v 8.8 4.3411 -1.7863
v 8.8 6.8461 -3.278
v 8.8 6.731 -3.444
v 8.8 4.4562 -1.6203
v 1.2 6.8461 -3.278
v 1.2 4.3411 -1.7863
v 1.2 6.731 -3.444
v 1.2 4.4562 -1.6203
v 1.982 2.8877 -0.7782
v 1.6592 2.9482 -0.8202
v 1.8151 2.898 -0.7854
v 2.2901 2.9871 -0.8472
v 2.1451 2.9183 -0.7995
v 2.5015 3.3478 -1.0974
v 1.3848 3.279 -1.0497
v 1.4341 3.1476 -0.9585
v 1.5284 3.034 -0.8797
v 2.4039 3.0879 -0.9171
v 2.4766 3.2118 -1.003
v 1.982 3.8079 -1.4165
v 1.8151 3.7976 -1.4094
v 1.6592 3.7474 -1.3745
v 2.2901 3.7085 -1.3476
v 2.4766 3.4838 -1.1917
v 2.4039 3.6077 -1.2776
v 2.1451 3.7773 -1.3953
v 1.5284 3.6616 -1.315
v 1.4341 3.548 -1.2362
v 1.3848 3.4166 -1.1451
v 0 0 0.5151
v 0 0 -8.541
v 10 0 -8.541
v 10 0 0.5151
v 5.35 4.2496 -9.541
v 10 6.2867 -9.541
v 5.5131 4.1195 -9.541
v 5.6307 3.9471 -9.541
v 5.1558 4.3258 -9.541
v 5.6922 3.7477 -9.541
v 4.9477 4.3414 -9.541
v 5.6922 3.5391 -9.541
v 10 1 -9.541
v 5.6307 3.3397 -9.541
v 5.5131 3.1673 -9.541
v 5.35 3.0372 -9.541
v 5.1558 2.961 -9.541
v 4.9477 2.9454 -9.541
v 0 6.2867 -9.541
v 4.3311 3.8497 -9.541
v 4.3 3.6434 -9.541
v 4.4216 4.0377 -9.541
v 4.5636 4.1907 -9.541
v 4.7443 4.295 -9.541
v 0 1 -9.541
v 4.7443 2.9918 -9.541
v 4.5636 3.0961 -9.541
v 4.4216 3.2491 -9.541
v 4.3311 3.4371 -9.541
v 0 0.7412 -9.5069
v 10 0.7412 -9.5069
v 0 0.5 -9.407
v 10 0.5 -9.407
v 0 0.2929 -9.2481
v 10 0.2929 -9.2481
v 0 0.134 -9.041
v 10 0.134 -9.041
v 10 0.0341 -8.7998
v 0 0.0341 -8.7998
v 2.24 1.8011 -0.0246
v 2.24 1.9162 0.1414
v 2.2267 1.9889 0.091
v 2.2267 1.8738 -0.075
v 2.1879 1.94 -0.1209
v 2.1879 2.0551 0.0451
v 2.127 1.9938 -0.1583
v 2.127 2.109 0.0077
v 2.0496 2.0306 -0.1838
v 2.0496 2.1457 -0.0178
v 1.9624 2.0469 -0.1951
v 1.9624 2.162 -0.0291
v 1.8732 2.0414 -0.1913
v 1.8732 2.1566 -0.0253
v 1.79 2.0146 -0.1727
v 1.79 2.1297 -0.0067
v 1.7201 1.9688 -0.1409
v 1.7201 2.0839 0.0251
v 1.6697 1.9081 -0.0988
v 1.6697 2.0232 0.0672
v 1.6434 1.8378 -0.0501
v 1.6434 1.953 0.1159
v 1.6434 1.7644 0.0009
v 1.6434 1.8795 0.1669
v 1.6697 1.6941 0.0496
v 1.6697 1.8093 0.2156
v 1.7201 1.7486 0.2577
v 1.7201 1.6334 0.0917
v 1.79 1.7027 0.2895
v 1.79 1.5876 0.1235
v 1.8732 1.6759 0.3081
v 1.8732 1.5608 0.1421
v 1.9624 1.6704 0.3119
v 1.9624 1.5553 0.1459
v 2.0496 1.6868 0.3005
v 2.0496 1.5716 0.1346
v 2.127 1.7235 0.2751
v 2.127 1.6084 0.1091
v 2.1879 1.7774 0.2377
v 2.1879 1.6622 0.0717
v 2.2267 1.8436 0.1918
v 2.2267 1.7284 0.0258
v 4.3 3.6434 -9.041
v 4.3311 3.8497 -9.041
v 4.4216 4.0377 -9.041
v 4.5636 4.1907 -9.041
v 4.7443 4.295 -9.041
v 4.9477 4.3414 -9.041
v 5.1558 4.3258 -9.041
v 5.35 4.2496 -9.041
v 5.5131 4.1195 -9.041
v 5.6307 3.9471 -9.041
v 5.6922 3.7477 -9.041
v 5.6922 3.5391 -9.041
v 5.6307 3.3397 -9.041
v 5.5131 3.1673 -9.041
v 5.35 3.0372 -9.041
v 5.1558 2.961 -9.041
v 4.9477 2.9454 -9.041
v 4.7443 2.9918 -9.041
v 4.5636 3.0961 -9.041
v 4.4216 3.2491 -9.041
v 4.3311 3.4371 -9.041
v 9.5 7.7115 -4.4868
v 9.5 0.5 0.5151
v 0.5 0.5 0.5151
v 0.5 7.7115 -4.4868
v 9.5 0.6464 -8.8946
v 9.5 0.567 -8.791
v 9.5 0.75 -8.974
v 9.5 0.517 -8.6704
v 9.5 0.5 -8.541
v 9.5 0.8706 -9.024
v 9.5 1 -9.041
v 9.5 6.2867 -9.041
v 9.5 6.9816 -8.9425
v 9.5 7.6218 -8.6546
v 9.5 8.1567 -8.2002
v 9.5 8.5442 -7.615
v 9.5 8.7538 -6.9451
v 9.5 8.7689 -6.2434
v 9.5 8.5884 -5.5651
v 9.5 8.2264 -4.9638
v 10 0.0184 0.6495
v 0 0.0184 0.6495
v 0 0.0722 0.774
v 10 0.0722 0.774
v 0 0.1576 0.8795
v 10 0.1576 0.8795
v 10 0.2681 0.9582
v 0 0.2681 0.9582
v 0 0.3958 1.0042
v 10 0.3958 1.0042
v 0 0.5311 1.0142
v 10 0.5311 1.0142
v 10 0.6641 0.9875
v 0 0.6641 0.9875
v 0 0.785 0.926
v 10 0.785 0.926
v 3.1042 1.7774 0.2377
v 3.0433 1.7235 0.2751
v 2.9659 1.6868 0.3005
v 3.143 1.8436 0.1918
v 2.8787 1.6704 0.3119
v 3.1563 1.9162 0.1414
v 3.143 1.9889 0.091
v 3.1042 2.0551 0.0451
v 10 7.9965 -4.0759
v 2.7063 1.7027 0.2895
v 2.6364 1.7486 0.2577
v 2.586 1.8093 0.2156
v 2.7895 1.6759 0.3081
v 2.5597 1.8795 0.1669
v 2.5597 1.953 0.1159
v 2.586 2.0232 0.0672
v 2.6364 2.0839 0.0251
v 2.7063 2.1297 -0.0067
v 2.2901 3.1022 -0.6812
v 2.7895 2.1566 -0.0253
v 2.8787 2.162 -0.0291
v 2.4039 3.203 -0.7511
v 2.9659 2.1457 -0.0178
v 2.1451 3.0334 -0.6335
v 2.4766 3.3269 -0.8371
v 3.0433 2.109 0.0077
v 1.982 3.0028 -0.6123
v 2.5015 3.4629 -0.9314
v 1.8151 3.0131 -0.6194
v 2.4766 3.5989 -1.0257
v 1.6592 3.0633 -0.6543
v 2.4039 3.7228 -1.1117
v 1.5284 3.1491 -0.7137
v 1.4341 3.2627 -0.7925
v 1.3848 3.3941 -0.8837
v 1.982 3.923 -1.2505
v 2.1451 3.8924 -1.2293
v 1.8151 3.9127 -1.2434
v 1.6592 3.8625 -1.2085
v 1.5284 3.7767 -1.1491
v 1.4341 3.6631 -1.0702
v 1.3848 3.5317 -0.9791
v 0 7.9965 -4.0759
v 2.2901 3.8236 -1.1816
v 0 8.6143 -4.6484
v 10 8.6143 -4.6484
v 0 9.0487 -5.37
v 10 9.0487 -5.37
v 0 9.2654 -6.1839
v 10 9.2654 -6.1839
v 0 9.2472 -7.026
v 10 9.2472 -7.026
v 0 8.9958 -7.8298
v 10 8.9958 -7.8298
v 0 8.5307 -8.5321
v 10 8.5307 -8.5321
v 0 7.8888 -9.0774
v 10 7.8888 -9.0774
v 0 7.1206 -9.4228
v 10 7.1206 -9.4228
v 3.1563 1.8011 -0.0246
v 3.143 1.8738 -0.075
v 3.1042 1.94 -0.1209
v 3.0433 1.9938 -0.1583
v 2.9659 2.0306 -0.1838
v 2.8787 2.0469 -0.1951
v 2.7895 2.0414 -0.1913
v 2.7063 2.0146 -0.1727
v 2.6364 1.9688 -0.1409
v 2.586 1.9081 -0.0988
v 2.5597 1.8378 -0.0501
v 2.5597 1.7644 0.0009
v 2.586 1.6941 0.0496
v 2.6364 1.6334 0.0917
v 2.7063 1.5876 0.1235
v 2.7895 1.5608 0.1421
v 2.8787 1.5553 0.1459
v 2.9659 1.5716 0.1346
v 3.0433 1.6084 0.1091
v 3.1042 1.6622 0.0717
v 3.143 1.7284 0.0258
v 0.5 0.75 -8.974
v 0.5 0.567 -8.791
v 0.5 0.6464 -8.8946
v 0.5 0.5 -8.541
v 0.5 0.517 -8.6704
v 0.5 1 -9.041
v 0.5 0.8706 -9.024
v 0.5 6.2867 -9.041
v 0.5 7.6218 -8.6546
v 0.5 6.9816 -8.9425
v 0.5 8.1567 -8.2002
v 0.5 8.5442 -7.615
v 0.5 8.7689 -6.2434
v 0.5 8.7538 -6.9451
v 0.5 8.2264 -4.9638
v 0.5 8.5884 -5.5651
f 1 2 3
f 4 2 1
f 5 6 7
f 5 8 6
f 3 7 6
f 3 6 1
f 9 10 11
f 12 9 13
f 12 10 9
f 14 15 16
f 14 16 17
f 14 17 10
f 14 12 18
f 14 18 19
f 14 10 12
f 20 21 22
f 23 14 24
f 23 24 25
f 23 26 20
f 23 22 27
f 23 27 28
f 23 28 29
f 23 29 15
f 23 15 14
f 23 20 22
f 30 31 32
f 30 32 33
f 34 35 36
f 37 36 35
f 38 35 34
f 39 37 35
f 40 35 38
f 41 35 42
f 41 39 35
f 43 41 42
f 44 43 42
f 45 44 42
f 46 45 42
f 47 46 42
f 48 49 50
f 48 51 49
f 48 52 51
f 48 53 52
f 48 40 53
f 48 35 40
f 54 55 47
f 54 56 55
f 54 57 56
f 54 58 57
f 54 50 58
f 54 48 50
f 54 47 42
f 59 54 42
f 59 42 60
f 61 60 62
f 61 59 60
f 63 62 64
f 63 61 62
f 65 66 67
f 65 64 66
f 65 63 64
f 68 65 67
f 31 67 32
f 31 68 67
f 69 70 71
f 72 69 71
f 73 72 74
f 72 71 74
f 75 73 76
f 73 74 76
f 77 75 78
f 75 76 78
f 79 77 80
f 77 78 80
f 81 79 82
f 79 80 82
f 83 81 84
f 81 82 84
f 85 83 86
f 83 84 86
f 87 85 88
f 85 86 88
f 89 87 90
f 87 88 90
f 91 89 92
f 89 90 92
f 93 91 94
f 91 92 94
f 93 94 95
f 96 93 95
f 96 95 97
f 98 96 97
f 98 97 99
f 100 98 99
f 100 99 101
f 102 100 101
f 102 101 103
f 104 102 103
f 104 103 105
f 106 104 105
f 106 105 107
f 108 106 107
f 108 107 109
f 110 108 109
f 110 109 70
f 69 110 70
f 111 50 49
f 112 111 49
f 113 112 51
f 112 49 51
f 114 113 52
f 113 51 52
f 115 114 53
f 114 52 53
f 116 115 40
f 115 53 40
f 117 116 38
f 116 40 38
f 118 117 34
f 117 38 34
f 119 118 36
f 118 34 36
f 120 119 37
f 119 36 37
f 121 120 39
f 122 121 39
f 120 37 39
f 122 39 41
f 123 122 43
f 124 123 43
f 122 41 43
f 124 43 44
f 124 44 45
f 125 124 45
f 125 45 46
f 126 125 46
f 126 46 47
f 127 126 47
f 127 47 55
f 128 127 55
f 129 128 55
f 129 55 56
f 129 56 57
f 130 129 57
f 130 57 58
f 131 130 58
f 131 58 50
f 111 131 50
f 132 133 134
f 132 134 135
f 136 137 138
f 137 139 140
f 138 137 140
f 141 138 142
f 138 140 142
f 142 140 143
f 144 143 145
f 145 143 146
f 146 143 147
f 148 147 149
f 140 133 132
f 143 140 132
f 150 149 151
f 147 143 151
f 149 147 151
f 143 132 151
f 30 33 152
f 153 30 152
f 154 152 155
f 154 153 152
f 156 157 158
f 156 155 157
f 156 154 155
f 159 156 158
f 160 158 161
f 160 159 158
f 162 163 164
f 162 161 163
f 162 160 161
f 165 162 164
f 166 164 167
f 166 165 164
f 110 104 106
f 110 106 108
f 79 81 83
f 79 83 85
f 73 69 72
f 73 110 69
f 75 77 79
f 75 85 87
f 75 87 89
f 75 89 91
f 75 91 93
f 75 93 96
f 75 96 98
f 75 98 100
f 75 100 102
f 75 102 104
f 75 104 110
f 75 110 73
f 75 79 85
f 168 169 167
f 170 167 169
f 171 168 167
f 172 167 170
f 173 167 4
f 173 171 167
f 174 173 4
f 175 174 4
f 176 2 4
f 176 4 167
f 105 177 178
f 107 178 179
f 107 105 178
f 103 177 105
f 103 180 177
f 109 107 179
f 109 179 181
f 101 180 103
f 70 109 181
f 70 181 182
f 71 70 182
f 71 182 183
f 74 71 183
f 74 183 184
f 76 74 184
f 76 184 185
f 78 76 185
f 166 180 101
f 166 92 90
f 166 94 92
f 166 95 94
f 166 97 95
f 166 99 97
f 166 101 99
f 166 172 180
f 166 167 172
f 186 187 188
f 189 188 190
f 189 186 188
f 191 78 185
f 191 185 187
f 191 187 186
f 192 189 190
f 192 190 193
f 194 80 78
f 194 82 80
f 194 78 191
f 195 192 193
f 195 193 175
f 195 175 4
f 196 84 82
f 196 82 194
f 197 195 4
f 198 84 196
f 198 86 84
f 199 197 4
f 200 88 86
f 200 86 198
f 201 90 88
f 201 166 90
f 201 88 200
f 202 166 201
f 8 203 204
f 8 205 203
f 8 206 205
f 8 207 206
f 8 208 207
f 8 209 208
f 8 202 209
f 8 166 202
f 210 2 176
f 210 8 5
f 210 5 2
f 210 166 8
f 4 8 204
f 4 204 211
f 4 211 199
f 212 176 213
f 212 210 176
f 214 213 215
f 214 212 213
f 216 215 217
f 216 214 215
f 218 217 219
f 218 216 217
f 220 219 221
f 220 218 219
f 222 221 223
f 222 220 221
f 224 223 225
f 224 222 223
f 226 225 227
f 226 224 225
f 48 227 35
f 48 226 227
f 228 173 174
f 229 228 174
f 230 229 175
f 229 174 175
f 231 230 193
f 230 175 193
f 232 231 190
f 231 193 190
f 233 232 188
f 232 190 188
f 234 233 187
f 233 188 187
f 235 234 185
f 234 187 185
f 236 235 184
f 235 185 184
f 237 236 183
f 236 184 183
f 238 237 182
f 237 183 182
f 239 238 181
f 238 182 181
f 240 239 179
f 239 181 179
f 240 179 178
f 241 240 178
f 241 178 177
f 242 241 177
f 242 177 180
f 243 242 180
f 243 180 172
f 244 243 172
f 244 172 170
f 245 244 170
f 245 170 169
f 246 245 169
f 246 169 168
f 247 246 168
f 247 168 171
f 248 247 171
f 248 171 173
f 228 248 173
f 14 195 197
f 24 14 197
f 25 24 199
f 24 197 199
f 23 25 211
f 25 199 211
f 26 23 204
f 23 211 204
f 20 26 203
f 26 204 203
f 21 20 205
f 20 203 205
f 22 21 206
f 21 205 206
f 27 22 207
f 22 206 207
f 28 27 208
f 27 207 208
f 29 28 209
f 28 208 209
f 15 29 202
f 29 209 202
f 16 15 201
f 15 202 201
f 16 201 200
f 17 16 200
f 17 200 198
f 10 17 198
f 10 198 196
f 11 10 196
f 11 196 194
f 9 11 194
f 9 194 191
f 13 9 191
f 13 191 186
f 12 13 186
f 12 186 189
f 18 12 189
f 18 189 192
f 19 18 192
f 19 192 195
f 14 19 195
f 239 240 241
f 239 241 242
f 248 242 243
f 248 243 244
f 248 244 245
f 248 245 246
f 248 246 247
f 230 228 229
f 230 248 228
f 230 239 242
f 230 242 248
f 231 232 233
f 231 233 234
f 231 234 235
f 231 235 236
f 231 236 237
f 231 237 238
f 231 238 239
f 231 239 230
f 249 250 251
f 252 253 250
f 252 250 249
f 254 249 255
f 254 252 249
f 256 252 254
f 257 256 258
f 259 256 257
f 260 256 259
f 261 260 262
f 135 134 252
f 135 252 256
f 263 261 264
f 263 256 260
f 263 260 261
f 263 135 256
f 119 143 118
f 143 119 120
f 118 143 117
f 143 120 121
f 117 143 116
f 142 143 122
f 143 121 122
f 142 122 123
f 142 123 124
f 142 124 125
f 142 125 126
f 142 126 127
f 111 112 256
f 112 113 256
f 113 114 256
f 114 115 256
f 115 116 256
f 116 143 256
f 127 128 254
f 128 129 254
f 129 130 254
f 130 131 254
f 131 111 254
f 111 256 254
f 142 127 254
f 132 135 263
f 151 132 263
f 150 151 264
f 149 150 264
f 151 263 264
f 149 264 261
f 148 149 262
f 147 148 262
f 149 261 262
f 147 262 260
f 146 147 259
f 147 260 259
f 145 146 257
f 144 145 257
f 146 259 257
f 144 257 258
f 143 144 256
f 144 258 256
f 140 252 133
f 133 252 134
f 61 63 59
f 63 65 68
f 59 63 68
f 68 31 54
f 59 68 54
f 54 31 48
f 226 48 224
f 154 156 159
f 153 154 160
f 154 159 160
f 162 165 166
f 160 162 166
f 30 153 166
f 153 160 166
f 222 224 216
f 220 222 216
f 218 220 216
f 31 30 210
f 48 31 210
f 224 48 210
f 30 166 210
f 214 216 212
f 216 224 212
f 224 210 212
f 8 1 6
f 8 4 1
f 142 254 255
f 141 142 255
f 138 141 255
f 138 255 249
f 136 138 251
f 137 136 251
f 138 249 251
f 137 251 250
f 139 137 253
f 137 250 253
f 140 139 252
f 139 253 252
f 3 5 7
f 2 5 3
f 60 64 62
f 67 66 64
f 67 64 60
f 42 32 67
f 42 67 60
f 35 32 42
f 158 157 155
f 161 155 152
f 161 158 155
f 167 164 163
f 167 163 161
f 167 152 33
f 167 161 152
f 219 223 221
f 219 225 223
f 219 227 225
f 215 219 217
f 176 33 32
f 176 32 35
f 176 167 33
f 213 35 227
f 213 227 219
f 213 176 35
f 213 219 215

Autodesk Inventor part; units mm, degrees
ref_plane "YZ Plane" through (0, 0, 0) normal (1, 0, 0) x (0, 1, 0)
ref_plane "XZ Plane" through (0, 0, 0) normal (0, 1, 0) x (-1, 0, 0)
ref_plane "XY Plane" through (0, 0, 0) normal (0, 0, 1) x (1, 0, 0)
sketch "Sketch1" plane through (0, 0, 0) normal (1, 0, 0) x (0, 1, 0)
  circle A0 centre (6.2867, -6.541) radius 3
  line L0 (6.2867, -9.541) -> (1, -9.541)
  line L1 (0, -8.541) -> (0, 0.5151)
  line L2 (0.785, 0.926) -> (7.9965, -4.0759)
  arc A1 (0.785, 0.926) -> (0, 0.5151) centre (0.5, 0.5151) ccw
  arc A2 (0, -8.541) -> (1, -9.541) centre (1, -8.541) ccw
  point P0 (0, 0)
  dimension "d0" = 6
  dimension "d1" = 0.5
  dimension "d2" = 1
extrude "Extrusion1" add sketch "Sketch1" along normal blind 10
shell "Shell1" thickness 0.5 removed faces 0
sketch "Sketch2" plane through (0, 0.785, 0.926) normal (0, 0.5699242, 0.8216972) x (1, 0, 0)
  line L0 (0, 8.7764) -> (0, 0) projected
  line L1 (0, 0) -> (10, 0) projected
  line L2 (10, 8.7764) -> (10, 0) projected
  line L3 (0, 8.7764) -> (10, 8.7764) projected
  line L4 (1.2, 7.3764) -> (8.8, 7.3764)
  line L5 (8.8, 7.3764) -> (8.8, 4.4678)
  line L6 (8.8, 4.4678) -> (1.2, 4.4678)
  line L7 (1.2, 4.4678) -> (1.2, 7.3764)
  circle A0 centre (1.94, 3.259) radius 0.5615
  circle A1 centre (1.94, 1.3767) radius 0.3
  circle A2 centre (2.8563, 1.3767) radius 0.3
  point P0 (0, -0.1173)
  dimension "d6" = 1.4
  dimension "d7" = 1.2
  dimension "d8" = 1.2
  dimension "d9" = 0.6
  dimension "d10" = 0.6
extrude "Extrusion2" cut sketch "Sketch2" against normal blind 0.2 contours L4 L5 L6 L7 | A0 | A1 | A2
sketch "Sketch3" plane through (0, 1, -9.541) normal (0, 0, -1) x (-1, 0, 0)
  circle A0 centre (-5, 2.6434) radius 0.7
  line L0 (0, 0) -> (0, 5.2867) projected
  line L1 (0, 5.2867) -> (-10, 5.2867) projected
  line L2 (-10, 0) -> (-10, 5.2867) projected
  line L3 (0, 0) -> (-10, 0) projected
  point P0 (0, -1)
  dimension "d13" = 1.4
extrude "Extrusion3" cut sketch "Sketch3" against normal blind 1 contours A0
properties part number "caja del arduino"
